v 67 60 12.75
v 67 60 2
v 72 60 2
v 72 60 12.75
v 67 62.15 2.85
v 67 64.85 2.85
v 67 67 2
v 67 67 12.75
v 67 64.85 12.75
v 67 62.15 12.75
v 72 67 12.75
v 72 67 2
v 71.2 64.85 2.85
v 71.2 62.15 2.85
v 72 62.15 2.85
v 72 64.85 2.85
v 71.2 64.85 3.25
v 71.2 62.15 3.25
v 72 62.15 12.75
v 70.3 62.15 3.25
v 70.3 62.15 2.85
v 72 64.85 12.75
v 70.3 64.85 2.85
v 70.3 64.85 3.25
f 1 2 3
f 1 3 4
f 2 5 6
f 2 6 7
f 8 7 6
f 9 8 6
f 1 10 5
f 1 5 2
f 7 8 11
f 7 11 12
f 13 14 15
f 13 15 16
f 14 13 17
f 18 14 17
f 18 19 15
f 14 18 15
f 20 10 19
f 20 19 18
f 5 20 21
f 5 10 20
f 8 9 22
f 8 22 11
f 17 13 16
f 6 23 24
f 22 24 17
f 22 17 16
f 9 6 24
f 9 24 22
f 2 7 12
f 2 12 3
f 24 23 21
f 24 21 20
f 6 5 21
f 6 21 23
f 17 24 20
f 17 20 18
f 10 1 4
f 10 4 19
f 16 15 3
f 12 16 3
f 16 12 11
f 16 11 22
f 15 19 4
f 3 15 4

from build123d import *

# Parameters (mm, degrees)
EXTRUDE032_DEPTH = 5
SKETCH036_W      = 0.9
SKETCH036_H      = 1.25
EXTRUDE033_DEPTH = 7


with BuildPart() as extrude032:
    # Sketch035 → Extrude032 (new body)
    with BuildSketch(Plane.YZ.offset(67)):
        Polygon((60, 12.75), (62.15, 12.75), (62.15, 2.85), (64.85, 2.85), (64.85, 12.75), (67, 12.75), (67, 2), (60, 2), align=None)
    extrude(amount=EXTRUDE032_DEPTH)


with BuildPart() as switchholdbottomin:
    # Sketch036 → Extrude033 (new body)
    with BuildSketch(Plane.XZ):
        with Locations((70.75, 2.625)):
            Rectangle(SKETCH036_W, SKETCH036_H)
    extrude(amount=EXTRUDE033_DEPTH)


with BuildPart() as switchholdbottomin_1:
    # Extrude033 placement: moved
    add(switchholdbottomin.part.moved(Location((0, 67, 0))))

    # Fusion: union Extrude032
    add(extrude032.part)


solid = switchholdbottomin_1.part
